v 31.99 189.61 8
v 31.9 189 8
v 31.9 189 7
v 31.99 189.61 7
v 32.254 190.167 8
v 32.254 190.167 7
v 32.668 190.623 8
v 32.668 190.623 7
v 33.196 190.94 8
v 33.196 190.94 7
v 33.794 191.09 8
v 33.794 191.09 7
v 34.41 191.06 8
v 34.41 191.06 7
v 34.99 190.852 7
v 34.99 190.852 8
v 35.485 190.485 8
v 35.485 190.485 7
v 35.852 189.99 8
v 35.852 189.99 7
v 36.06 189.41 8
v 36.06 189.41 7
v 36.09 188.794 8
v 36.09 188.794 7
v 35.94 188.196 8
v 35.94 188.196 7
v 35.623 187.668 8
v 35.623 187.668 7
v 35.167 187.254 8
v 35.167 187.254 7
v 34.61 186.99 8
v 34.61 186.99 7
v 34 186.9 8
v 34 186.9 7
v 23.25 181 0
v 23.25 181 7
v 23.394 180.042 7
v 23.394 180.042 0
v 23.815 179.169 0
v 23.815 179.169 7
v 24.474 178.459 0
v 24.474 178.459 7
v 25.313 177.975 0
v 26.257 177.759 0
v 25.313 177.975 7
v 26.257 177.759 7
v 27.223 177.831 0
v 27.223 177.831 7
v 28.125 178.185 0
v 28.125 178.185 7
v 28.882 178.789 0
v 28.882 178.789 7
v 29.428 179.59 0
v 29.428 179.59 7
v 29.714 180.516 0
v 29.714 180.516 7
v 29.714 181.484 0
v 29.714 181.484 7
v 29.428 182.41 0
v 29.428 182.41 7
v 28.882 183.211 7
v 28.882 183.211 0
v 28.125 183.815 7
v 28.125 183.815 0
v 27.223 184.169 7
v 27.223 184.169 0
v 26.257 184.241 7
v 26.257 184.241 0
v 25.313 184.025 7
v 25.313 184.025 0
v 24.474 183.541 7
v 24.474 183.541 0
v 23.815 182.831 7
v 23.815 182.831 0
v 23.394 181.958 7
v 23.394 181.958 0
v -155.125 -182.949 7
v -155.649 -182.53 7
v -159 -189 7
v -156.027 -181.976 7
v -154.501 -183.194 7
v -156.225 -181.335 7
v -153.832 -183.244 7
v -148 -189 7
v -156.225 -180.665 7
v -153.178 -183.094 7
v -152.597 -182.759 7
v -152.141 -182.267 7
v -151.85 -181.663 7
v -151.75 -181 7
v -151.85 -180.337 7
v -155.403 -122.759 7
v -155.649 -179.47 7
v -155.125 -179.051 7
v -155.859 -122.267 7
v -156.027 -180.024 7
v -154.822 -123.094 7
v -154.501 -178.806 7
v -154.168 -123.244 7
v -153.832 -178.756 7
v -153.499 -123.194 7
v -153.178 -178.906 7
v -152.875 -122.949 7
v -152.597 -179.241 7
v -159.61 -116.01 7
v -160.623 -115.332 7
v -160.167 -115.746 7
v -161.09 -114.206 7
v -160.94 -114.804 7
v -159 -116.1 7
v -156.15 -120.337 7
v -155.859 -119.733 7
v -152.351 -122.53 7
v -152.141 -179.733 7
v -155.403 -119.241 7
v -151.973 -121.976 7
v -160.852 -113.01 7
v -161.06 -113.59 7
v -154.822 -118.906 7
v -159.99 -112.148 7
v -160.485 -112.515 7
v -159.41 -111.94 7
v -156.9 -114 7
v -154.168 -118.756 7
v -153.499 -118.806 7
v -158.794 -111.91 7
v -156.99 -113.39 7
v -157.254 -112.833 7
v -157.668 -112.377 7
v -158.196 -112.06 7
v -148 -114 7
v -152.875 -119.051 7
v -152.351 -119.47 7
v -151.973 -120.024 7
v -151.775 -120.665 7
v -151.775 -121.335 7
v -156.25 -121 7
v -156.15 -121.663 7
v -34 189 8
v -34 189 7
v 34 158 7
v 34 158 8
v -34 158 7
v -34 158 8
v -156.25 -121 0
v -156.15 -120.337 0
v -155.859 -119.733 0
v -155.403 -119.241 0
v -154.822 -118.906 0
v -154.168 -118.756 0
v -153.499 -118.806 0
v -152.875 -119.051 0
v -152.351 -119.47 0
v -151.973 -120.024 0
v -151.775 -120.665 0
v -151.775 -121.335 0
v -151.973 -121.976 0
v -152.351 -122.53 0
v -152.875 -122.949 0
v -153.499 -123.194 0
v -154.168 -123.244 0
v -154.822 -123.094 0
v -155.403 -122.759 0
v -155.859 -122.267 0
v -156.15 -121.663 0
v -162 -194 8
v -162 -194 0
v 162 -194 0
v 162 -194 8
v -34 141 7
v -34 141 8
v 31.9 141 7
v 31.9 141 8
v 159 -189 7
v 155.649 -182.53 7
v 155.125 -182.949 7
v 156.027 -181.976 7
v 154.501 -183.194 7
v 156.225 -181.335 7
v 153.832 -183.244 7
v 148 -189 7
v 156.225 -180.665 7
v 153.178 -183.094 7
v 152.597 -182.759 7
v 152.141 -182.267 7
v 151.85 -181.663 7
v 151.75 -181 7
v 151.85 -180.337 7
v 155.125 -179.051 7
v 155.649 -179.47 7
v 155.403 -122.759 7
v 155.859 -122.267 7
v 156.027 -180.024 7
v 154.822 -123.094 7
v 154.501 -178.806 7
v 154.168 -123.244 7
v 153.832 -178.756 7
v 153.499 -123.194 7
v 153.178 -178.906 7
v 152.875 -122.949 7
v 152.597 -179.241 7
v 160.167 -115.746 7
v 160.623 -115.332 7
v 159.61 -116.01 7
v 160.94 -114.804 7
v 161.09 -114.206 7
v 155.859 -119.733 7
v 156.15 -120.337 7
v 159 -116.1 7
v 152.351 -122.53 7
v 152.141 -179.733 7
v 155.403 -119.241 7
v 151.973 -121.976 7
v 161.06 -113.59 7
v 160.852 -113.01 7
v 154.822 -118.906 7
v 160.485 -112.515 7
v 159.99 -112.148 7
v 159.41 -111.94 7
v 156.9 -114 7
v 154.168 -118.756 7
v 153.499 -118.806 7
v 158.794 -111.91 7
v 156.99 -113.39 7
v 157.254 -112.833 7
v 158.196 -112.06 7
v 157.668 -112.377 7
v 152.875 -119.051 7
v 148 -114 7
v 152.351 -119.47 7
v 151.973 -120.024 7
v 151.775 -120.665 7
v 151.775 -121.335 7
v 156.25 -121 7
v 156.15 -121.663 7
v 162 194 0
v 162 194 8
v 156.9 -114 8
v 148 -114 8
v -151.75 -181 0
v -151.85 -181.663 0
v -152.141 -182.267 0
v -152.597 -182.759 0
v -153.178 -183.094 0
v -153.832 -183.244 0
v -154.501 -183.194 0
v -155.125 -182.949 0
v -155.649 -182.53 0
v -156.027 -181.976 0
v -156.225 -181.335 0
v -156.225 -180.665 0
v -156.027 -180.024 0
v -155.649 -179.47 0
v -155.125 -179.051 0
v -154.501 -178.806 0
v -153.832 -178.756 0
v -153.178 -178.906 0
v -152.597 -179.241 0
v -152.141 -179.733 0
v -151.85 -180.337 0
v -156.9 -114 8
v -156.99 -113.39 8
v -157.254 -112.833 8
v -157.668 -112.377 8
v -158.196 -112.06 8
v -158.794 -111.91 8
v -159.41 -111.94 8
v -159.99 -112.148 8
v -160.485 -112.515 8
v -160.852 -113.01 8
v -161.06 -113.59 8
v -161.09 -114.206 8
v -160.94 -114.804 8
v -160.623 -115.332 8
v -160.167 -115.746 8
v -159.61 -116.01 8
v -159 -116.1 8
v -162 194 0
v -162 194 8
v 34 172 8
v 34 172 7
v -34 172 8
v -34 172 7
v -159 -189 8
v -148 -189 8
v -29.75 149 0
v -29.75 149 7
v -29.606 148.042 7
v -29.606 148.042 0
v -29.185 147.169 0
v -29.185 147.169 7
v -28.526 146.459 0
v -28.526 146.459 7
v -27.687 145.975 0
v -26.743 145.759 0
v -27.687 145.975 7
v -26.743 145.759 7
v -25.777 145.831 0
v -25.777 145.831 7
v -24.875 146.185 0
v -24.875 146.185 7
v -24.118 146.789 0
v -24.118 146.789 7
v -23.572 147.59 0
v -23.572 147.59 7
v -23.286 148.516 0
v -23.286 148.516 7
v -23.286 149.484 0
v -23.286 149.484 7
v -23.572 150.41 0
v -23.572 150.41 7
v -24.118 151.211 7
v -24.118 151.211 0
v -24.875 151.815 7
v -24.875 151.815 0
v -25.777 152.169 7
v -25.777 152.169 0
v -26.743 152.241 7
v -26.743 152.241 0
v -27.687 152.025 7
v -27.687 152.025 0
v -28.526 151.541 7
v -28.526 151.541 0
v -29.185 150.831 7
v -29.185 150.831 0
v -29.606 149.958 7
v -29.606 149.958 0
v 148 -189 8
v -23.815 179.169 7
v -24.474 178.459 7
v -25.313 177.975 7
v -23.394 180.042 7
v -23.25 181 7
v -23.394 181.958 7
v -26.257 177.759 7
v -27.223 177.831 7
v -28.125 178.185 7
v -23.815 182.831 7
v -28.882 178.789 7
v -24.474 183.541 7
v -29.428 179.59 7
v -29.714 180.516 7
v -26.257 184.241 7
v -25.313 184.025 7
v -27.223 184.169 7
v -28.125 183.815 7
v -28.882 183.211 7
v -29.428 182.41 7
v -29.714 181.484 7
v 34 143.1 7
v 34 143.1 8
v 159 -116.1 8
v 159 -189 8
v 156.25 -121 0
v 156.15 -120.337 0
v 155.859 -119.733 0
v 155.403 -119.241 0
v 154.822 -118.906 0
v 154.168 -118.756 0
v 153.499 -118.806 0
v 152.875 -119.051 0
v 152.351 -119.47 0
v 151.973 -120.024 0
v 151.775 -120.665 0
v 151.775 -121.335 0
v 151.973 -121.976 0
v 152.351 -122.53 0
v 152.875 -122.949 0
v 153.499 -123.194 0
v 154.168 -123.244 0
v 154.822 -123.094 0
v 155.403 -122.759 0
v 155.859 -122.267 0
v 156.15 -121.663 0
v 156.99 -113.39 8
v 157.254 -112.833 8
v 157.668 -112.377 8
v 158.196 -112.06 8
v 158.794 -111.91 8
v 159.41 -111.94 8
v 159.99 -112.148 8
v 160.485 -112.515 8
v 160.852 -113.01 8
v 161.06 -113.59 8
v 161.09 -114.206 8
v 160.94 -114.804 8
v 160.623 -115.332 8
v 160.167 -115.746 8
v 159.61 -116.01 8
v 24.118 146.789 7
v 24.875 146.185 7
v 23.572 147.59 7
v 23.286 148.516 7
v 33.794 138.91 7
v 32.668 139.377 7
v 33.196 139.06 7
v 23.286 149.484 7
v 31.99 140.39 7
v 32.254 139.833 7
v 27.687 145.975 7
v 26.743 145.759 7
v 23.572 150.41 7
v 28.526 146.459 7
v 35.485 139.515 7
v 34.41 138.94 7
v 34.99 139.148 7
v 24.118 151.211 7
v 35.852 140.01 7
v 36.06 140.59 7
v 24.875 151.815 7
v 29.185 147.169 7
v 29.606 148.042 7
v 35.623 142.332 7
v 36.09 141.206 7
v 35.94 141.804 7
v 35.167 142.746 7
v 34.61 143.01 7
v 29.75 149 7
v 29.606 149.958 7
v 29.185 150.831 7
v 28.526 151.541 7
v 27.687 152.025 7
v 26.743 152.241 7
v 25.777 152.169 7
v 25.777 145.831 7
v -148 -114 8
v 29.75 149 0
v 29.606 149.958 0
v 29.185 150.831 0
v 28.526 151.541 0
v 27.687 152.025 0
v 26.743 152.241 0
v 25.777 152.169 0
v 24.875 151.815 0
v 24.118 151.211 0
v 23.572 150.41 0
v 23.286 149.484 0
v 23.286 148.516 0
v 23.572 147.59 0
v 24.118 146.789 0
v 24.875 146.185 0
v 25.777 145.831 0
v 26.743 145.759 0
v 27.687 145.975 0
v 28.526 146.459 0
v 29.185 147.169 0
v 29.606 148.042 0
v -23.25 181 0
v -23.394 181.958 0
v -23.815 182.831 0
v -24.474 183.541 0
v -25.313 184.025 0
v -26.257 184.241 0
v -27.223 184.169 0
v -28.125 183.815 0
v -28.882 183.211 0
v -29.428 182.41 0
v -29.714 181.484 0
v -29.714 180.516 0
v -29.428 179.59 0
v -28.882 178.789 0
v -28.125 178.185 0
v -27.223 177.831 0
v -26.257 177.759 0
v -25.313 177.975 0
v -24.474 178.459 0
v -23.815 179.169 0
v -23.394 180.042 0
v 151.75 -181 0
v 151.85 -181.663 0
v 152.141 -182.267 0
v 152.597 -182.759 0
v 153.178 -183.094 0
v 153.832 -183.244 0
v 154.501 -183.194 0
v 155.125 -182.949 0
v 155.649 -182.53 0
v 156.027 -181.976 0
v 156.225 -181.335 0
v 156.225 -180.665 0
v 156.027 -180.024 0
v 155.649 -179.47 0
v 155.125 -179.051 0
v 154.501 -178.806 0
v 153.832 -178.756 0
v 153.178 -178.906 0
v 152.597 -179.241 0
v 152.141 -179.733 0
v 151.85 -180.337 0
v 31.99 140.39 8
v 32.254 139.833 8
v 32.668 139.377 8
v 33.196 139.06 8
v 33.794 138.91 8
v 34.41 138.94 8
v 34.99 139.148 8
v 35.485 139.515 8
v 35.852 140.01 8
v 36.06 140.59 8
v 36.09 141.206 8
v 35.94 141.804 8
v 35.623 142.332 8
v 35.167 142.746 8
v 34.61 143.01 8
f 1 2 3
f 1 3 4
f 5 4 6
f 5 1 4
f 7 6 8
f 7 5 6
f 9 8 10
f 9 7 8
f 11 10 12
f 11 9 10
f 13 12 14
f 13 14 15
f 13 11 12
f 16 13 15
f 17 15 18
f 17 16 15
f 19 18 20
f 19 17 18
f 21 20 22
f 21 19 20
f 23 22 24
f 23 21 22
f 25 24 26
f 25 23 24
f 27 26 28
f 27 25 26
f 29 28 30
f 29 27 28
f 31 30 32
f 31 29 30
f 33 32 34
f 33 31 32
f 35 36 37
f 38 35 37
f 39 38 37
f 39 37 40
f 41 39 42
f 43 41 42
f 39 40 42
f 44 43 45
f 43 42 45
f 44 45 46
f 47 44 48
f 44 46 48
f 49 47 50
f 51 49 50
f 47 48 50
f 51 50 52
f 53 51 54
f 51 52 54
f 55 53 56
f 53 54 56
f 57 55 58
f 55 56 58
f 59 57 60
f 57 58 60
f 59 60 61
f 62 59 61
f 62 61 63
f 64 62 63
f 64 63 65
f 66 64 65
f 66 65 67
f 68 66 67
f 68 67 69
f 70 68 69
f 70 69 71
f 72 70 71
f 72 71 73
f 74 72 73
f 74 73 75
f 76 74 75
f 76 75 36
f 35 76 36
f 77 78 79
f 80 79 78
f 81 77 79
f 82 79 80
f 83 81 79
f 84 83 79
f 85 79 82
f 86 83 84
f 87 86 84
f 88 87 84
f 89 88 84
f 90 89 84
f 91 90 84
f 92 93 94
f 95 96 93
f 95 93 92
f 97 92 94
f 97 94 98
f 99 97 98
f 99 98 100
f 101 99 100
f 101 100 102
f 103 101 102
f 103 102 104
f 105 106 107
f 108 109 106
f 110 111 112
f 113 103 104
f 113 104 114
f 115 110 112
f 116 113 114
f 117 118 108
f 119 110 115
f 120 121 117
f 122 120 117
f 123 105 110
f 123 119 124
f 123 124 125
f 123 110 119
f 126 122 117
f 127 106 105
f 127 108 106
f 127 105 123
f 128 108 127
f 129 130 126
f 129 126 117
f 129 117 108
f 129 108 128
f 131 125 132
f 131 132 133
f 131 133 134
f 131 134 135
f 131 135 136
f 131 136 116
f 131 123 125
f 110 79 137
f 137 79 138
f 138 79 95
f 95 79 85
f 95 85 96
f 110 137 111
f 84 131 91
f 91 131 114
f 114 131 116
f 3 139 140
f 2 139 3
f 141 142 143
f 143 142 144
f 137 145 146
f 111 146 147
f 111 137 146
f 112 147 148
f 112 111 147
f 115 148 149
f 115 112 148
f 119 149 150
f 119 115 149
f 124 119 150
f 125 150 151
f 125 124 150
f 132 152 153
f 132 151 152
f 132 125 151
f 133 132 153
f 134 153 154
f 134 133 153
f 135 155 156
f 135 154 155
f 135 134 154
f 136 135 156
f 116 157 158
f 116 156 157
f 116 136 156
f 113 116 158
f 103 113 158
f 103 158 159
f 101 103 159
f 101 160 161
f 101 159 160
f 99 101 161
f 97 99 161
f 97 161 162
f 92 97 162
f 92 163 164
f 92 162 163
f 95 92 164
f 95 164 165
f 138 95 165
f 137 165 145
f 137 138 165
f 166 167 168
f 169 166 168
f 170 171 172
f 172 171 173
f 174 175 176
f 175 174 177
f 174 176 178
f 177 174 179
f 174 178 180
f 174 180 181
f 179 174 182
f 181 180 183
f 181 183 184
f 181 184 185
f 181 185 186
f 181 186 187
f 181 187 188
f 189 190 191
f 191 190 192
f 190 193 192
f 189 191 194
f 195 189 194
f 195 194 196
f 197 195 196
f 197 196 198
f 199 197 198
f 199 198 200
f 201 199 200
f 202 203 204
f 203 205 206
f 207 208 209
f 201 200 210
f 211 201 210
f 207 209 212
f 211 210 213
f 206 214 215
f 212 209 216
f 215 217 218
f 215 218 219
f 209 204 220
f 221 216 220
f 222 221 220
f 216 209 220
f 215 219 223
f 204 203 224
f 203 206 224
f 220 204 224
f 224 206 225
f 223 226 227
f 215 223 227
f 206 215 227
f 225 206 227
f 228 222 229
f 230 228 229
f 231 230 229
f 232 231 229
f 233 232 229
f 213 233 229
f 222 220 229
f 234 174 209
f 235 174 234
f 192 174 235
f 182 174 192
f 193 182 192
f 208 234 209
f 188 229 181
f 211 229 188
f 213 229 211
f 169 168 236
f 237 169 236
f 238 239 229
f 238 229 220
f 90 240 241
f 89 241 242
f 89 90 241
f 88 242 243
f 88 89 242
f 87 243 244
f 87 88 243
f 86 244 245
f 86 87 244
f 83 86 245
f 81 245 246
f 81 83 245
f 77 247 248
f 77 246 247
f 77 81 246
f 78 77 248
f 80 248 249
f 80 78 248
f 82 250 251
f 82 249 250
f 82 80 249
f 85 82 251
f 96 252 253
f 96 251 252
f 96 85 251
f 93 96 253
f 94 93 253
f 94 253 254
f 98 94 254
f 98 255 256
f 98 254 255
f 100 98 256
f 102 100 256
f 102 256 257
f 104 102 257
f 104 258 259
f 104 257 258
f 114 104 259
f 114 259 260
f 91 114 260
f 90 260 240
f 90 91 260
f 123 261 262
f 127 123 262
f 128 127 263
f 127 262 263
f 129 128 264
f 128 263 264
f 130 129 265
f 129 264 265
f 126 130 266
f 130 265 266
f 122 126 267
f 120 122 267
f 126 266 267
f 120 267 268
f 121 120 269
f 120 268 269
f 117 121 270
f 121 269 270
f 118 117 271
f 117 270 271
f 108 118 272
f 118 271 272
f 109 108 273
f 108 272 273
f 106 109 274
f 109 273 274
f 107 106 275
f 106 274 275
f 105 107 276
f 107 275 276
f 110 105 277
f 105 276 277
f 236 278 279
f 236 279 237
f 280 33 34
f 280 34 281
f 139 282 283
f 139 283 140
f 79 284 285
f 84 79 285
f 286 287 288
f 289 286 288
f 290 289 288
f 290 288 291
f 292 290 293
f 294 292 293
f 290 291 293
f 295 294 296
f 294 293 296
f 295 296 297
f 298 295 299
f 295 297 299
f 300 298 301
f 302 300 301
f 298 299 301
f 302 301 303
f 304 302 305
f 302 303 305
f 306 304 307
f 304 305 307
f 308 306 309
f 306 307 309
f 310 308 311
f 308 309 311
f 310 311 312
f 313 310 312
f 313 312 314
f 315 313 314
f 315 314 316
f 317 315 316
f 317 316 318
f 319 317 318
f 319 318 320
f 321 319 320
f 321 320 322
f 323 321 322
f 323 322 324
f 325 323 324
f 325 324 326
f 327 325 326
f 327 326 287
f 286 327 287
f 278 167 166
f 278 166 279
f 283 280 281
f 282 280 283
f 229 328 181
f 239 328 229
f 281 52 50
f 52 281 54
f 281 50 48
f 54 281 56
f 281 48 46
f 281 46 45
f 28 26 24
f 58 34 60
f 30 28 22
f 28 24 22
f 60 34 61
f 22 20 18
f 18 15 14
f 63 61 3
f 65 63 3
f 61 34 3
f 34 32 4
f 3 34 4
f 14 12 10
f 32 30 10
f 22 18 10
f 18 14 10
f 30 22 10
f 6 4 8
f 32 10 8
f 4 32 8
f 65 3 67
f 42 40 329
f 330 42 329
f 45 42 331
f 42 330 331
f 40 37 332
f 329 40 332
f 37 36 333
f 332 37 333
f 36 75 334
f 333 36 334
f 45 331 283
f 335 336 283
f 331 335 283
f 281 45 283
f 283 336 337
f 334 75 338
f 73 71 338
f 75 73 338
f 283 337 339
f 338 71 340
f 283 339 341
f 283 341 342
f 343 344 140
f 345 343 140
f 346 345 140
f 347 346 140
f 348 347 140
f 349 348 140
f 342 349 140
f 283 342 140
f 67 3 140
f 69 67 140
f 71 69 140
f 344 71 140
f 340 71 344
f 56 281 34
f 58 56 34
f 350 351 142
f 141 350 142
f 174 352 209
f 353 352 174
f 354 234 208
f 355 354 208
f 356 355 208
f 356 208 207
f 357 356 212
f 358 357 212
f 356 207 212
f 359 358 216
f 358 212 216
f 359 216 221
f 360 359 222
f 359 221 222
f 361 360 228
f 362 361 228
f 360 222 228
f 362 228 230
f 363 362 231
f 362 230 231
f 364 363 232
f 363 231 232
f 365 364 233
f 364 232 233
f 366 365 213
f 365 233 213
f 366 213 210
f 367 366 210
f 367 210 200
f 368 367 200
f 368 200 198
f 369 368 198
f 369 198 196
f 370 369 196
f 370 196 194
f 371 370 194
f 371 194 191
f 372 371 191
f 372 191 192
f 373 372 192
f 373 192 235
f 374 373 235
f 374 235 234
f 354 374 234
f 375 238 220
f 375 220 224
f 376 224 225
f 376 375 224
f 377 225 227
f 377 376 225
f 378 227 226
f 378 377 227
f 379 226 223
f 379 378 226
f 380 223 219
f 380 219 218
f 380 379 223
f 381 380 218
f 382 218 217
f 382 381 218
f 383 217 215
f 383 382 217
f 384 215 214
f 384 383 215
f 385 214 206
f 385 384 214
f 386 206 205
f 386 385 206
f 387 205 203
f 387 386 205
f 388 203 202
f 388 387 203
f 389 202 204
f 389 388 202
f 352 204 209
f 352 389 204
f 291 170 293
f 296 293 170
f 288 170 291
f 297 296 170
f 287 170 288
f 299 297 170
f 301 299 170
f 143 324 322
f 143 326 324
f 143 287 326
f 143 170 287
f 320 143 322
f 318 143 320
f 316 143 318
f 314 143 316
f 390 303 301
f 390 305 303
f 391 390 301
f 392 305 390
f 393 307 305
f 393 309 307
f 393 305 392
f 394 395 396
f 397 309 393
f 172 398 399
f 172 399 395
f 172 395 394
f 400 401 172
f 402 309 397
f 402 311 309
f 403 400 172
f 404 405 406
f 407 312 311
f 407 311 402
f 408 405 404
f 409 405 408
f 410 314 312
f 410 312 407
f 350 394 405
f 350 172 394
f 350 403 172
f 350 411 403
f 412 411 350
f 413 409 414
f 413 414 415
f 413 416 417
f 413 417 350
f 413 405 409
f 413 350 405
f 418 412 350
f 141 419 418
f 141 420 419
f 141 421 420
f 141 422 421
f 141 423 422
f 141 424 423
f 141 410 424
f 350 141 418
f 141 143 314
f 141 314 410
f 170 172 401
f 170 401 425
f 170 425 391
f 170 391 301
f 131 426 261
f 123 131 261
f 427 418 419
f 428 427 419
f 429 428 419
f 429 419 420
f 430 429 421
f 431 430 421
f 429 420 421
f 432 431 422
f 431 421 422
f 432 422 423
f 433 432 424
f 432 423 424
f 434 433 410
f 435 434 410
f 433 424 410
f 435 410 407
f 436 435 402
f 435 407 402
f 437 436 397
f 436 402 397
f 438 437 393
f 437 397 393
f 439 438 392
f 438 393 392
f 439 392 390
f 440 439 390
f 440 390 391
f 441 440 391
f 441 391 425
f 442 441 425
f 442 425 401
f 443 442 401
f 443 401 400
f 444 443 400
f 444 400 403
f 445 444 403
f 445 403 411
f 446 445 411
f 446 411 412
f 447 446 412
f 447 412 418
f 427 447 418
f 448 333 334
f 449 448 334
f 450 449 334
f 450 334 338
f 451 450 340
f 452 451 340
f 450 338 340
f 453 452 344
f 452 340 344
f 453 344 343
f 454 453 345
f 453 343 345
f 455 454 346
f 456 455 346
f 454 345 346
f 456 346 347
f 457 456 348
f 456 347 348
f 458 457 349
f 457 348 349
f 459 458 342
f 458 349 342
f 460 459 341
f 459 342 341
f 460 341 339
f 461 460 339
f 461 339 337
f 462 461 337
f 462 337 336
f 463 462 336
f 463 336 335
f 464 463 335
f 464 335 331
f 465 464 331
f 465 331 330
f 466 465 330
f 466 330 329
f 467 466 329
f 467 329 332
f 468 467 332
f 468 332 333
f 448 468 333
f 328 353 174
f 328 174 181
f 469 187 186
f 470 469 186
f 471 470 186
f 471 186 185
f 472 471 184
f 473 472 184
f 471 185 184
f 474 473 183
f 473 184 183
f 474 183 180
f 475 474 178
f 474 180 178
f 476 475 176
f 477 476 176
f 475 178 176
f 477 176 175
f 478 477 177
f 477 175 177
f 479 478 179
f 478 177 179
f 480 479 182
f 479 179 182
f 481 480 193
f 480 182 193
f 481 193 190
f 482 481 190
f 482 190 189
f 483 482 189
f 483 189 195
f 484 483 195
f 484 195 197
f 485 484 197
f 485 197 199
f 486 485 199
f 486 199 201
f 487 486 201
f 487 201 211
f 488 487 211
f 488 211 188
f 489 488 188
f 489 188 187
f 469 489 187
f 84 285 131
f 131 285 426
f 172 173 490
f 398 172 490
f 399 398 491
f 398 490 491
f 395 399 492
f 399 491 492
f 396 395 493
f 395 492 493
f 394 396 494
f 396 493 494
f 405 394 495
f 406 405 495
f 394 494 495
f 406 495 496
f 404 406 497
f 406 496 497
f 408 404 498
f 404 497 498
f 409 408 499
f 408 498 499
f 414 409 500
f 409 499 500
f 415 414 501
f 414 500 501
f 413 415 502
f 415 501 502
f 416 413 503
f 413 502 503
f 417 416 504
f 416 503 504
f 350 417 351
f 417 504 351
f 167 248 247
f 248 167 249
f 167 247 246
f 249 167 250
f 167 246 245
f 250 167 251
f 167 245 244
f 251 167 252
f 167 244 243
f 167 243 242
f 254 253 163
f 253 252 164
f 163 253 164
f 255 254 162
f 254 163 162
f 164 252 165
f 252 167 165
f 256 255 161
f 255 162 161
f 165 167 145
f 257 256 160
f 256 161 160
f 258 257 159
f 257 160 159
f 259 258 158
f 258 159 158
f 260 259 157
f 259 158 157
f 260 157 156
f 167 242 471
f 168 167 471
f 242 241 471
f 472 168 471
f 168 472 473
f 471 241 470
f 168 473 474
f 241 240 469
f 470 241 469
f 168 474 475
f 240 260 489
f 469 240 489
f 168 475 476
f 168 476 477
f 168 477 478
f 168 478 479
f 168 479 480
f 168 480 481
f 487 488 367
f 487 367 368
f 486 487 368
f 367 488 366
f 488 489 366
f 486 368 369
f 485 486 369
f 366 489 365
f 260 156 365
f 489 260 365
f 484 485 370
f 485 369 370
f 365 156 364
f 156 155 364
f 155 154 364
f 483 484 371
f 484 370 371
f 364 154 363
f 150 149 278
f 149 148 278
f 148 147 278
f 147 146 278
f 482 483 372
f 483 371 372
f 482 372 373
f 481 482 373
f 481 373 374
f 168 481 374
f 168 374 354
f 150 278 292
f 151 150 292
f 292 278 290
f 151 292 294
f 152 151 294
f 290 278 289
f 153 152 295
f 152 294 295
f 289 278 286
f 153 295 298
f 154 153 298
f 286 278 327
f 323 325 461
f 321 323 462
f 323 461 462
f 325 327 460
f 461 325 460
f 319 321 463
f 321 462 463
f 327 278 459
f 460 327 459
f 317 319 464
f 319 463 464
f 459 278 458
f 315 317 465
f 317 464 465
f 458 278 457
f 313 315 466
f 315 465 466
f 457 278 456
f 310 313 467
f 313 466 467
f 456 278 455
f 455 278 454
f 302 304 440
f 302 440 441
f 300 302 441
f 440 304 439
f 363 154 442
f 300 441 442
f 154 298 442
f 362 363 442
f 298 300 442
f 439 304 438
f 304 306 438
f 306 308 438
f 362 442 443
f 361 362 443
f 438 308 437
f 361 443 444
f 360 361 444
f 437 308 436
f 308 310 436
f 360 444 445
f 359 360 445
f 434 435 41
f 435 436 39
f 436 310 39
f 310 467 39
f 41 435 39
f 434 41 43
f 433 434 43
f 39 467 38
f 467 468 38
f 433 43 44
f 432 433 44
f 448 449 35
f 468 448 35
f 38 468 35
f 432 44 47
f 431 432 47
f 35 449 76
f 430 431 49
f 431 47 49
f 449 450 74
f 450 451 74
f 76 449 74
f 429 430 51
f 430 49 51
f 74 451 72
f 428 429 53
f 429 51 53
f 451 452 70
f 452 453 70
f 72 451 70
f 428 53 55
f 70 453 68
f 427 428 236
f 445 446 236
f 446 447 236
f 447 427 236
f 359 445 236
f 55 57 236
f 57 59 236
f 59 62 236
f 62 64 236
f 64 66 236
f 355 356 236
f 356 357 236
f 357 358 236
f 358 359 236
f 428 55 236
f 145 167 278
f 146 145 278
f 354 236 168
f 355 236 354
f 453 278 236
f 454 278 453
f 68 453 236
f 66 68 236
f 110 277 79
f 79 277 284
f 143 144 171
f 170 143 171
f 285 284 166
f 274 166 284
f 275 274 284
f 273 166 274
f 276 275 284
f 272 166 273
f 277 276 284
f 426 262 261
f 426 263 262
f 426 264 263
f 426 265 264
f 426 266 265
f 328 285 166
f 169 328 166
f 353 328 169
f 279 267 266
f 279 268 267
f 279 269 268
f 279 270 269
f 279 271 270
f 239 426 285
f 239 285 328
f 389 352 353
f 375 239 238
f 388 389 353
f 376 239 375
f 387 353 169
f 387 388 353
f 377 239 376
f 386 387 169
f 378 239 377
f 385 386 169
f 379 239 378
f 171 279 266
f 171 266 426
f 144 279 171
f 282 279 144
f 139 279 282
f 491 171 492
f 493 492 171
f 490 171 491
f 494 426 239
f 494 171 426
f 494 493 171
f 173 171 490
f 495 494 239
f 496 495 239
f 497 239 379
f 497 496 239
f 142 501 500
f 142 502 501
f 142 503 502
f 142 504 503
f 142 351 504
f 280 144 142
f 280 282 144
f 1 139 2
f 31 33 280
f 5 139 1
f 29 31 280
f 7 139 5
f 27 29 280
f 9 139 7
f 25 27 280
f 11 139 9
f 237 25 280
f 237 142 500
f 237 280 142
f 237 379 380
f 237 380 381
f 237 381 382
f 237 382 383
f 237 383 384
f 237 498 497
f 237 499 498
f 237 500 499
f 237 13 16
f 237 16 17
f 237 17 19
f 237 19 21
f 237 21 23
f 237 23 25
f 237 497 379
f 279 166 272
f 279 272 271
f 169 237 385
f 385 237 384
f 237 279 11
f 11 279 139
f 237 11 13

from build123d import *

# Parameters (mm, degrees)
ESQUISSE1_W             = 324
ESQUISSE1_H             = 388
BOSS_EXTRU_1_DEPTH      = 8
ENL_V_MAT_EXTRU_1_DEPTH = 1
ESQUISSE3_R             = 2.25
ENL_V_MAT_EXTRU_2_DEPTH = 253.841847802
ENL_V_MAT_EXTRU_3_DEPTH = 1
ESQUISSE5_R             = 3.25
ENL_V_MAT_EXTRU_4_DEPTH = 253.841847802


with BuildPart() as part:
    # Esquisse1 → Boss.-Extru.1 (new body)
    with BuildSketch(Plane.XY):
        Rectangle(ESQUISSE1_W, ESQUISSE1_H)
    extrude(amount=BOSS_EXTRU_1_DEPTH)

    # Esquisse2 → Enlèv. mat.-Extru.1 (cut)
    with BuildSketch(Plane.XY.offset(8)):
        with BuildLine():
            Line((148, -114), (156.9, -114))
            ThreePointArc((156.9, -114), (160.48492424, -112.51507576), (159, -116.1))
            Line((159, -116.1), (159, -189))
            Line((159, -189), (148, -189))
            Line((148, -189), (148, -114))
        make_face()
    enl_v_mat_extru_1 = extrude(amount=-ENL_V_MAT_EXTRU_1_DEPTH, mode=Mode.SUBTRACT)

    # Symétrie1: Enlèv. mat.-Extru.1 across plane
    add(enl_v_mat_extru_1.mirror(Plane(origin=(0, 0, 0), x_dir=(0, 0, 1), z_dir=(1, 0, 0))), mode=Mode.SUBTRACT)

    # Esquisse3 → Enlèv. mat.-Extru.2 (cut, through all)
    with BuildSketch(Plane.XY.offset(7)):
        with Locations((154, -121)):
            Circle(ESQUISSE3_R)
        with Locations(Location((154, -181, 0), (0, 0, 180))):
            Circle(ESQUISSE3_R)
    enl_v_mat_extru_2 = extrude(amount=-ENL_V_MAT_EXTRU_2_DEPTH, mode=Mode.SUBTRACT)

    # Symétrie2: Enlèv. mat.-Extru.2 across plane
    add(enl_v_mat_extru_2.mirror(Plane(origin=(0, 0, 0), x_dir=(0, 0, 1), z_dir=(1, 0, 0))), mode=Mode.SUBTRACT)

    # Esquisse4 → Enlèv. mat.-Extru.3 (cut)
    with BuildSketch(Plane.XY.offset(8)):
        with BuildLine():
            Line((-34, 189), (31.9, 189))
            ThreePointArc((31.9, 189), (35.48492424, 190.48492424), (34, 186.9))
            Line((34, 186.9), (34, 172))
            Line((34, 172), (-34, 172))
            Line((-34, 172), (-34, 189))
        make_face()
        with BuildLine():
            Line((34, 143.1), (34, 158))
            Line((34, 158), (-34, 158))
            Line((-34, 158), (-34, 141))
            Line((-34, 141), (31.9, 141))
            ThreePointArc((31.9, 141), (35.48492424, 139.51507576), (34, 143.1))
        make_face()
    extrude(amount=-ENL_V_MAT_EXTRU_3_DEPTH, mode=Mode.SUBTRACT)

    # Esquisse5 → Enlèv. mat.-Extru.4 (cut, through all)
    with BuildSketch(Plane.XY.offset(7)):
        with Locations((-26.5, 181)):
            Circle(ESQUISSE5_R)
        with Locations(Location((26.5, 181, 0), (0, 0, 180))):
            Circle(ESQUISSE5_R)
        with Locations((26.5, 149)):
            Circle(ESQUISSE5_R)
        with Locations(Location((-26.5, 149, 0), (0, 0, 180))):
            Circle(ESQUISSE5_R)
    extrude(amount=-ENL_V_MAT_EXTRU_4_DEPTH, mode=Mode.SUBTRACT)


solid = part.part
